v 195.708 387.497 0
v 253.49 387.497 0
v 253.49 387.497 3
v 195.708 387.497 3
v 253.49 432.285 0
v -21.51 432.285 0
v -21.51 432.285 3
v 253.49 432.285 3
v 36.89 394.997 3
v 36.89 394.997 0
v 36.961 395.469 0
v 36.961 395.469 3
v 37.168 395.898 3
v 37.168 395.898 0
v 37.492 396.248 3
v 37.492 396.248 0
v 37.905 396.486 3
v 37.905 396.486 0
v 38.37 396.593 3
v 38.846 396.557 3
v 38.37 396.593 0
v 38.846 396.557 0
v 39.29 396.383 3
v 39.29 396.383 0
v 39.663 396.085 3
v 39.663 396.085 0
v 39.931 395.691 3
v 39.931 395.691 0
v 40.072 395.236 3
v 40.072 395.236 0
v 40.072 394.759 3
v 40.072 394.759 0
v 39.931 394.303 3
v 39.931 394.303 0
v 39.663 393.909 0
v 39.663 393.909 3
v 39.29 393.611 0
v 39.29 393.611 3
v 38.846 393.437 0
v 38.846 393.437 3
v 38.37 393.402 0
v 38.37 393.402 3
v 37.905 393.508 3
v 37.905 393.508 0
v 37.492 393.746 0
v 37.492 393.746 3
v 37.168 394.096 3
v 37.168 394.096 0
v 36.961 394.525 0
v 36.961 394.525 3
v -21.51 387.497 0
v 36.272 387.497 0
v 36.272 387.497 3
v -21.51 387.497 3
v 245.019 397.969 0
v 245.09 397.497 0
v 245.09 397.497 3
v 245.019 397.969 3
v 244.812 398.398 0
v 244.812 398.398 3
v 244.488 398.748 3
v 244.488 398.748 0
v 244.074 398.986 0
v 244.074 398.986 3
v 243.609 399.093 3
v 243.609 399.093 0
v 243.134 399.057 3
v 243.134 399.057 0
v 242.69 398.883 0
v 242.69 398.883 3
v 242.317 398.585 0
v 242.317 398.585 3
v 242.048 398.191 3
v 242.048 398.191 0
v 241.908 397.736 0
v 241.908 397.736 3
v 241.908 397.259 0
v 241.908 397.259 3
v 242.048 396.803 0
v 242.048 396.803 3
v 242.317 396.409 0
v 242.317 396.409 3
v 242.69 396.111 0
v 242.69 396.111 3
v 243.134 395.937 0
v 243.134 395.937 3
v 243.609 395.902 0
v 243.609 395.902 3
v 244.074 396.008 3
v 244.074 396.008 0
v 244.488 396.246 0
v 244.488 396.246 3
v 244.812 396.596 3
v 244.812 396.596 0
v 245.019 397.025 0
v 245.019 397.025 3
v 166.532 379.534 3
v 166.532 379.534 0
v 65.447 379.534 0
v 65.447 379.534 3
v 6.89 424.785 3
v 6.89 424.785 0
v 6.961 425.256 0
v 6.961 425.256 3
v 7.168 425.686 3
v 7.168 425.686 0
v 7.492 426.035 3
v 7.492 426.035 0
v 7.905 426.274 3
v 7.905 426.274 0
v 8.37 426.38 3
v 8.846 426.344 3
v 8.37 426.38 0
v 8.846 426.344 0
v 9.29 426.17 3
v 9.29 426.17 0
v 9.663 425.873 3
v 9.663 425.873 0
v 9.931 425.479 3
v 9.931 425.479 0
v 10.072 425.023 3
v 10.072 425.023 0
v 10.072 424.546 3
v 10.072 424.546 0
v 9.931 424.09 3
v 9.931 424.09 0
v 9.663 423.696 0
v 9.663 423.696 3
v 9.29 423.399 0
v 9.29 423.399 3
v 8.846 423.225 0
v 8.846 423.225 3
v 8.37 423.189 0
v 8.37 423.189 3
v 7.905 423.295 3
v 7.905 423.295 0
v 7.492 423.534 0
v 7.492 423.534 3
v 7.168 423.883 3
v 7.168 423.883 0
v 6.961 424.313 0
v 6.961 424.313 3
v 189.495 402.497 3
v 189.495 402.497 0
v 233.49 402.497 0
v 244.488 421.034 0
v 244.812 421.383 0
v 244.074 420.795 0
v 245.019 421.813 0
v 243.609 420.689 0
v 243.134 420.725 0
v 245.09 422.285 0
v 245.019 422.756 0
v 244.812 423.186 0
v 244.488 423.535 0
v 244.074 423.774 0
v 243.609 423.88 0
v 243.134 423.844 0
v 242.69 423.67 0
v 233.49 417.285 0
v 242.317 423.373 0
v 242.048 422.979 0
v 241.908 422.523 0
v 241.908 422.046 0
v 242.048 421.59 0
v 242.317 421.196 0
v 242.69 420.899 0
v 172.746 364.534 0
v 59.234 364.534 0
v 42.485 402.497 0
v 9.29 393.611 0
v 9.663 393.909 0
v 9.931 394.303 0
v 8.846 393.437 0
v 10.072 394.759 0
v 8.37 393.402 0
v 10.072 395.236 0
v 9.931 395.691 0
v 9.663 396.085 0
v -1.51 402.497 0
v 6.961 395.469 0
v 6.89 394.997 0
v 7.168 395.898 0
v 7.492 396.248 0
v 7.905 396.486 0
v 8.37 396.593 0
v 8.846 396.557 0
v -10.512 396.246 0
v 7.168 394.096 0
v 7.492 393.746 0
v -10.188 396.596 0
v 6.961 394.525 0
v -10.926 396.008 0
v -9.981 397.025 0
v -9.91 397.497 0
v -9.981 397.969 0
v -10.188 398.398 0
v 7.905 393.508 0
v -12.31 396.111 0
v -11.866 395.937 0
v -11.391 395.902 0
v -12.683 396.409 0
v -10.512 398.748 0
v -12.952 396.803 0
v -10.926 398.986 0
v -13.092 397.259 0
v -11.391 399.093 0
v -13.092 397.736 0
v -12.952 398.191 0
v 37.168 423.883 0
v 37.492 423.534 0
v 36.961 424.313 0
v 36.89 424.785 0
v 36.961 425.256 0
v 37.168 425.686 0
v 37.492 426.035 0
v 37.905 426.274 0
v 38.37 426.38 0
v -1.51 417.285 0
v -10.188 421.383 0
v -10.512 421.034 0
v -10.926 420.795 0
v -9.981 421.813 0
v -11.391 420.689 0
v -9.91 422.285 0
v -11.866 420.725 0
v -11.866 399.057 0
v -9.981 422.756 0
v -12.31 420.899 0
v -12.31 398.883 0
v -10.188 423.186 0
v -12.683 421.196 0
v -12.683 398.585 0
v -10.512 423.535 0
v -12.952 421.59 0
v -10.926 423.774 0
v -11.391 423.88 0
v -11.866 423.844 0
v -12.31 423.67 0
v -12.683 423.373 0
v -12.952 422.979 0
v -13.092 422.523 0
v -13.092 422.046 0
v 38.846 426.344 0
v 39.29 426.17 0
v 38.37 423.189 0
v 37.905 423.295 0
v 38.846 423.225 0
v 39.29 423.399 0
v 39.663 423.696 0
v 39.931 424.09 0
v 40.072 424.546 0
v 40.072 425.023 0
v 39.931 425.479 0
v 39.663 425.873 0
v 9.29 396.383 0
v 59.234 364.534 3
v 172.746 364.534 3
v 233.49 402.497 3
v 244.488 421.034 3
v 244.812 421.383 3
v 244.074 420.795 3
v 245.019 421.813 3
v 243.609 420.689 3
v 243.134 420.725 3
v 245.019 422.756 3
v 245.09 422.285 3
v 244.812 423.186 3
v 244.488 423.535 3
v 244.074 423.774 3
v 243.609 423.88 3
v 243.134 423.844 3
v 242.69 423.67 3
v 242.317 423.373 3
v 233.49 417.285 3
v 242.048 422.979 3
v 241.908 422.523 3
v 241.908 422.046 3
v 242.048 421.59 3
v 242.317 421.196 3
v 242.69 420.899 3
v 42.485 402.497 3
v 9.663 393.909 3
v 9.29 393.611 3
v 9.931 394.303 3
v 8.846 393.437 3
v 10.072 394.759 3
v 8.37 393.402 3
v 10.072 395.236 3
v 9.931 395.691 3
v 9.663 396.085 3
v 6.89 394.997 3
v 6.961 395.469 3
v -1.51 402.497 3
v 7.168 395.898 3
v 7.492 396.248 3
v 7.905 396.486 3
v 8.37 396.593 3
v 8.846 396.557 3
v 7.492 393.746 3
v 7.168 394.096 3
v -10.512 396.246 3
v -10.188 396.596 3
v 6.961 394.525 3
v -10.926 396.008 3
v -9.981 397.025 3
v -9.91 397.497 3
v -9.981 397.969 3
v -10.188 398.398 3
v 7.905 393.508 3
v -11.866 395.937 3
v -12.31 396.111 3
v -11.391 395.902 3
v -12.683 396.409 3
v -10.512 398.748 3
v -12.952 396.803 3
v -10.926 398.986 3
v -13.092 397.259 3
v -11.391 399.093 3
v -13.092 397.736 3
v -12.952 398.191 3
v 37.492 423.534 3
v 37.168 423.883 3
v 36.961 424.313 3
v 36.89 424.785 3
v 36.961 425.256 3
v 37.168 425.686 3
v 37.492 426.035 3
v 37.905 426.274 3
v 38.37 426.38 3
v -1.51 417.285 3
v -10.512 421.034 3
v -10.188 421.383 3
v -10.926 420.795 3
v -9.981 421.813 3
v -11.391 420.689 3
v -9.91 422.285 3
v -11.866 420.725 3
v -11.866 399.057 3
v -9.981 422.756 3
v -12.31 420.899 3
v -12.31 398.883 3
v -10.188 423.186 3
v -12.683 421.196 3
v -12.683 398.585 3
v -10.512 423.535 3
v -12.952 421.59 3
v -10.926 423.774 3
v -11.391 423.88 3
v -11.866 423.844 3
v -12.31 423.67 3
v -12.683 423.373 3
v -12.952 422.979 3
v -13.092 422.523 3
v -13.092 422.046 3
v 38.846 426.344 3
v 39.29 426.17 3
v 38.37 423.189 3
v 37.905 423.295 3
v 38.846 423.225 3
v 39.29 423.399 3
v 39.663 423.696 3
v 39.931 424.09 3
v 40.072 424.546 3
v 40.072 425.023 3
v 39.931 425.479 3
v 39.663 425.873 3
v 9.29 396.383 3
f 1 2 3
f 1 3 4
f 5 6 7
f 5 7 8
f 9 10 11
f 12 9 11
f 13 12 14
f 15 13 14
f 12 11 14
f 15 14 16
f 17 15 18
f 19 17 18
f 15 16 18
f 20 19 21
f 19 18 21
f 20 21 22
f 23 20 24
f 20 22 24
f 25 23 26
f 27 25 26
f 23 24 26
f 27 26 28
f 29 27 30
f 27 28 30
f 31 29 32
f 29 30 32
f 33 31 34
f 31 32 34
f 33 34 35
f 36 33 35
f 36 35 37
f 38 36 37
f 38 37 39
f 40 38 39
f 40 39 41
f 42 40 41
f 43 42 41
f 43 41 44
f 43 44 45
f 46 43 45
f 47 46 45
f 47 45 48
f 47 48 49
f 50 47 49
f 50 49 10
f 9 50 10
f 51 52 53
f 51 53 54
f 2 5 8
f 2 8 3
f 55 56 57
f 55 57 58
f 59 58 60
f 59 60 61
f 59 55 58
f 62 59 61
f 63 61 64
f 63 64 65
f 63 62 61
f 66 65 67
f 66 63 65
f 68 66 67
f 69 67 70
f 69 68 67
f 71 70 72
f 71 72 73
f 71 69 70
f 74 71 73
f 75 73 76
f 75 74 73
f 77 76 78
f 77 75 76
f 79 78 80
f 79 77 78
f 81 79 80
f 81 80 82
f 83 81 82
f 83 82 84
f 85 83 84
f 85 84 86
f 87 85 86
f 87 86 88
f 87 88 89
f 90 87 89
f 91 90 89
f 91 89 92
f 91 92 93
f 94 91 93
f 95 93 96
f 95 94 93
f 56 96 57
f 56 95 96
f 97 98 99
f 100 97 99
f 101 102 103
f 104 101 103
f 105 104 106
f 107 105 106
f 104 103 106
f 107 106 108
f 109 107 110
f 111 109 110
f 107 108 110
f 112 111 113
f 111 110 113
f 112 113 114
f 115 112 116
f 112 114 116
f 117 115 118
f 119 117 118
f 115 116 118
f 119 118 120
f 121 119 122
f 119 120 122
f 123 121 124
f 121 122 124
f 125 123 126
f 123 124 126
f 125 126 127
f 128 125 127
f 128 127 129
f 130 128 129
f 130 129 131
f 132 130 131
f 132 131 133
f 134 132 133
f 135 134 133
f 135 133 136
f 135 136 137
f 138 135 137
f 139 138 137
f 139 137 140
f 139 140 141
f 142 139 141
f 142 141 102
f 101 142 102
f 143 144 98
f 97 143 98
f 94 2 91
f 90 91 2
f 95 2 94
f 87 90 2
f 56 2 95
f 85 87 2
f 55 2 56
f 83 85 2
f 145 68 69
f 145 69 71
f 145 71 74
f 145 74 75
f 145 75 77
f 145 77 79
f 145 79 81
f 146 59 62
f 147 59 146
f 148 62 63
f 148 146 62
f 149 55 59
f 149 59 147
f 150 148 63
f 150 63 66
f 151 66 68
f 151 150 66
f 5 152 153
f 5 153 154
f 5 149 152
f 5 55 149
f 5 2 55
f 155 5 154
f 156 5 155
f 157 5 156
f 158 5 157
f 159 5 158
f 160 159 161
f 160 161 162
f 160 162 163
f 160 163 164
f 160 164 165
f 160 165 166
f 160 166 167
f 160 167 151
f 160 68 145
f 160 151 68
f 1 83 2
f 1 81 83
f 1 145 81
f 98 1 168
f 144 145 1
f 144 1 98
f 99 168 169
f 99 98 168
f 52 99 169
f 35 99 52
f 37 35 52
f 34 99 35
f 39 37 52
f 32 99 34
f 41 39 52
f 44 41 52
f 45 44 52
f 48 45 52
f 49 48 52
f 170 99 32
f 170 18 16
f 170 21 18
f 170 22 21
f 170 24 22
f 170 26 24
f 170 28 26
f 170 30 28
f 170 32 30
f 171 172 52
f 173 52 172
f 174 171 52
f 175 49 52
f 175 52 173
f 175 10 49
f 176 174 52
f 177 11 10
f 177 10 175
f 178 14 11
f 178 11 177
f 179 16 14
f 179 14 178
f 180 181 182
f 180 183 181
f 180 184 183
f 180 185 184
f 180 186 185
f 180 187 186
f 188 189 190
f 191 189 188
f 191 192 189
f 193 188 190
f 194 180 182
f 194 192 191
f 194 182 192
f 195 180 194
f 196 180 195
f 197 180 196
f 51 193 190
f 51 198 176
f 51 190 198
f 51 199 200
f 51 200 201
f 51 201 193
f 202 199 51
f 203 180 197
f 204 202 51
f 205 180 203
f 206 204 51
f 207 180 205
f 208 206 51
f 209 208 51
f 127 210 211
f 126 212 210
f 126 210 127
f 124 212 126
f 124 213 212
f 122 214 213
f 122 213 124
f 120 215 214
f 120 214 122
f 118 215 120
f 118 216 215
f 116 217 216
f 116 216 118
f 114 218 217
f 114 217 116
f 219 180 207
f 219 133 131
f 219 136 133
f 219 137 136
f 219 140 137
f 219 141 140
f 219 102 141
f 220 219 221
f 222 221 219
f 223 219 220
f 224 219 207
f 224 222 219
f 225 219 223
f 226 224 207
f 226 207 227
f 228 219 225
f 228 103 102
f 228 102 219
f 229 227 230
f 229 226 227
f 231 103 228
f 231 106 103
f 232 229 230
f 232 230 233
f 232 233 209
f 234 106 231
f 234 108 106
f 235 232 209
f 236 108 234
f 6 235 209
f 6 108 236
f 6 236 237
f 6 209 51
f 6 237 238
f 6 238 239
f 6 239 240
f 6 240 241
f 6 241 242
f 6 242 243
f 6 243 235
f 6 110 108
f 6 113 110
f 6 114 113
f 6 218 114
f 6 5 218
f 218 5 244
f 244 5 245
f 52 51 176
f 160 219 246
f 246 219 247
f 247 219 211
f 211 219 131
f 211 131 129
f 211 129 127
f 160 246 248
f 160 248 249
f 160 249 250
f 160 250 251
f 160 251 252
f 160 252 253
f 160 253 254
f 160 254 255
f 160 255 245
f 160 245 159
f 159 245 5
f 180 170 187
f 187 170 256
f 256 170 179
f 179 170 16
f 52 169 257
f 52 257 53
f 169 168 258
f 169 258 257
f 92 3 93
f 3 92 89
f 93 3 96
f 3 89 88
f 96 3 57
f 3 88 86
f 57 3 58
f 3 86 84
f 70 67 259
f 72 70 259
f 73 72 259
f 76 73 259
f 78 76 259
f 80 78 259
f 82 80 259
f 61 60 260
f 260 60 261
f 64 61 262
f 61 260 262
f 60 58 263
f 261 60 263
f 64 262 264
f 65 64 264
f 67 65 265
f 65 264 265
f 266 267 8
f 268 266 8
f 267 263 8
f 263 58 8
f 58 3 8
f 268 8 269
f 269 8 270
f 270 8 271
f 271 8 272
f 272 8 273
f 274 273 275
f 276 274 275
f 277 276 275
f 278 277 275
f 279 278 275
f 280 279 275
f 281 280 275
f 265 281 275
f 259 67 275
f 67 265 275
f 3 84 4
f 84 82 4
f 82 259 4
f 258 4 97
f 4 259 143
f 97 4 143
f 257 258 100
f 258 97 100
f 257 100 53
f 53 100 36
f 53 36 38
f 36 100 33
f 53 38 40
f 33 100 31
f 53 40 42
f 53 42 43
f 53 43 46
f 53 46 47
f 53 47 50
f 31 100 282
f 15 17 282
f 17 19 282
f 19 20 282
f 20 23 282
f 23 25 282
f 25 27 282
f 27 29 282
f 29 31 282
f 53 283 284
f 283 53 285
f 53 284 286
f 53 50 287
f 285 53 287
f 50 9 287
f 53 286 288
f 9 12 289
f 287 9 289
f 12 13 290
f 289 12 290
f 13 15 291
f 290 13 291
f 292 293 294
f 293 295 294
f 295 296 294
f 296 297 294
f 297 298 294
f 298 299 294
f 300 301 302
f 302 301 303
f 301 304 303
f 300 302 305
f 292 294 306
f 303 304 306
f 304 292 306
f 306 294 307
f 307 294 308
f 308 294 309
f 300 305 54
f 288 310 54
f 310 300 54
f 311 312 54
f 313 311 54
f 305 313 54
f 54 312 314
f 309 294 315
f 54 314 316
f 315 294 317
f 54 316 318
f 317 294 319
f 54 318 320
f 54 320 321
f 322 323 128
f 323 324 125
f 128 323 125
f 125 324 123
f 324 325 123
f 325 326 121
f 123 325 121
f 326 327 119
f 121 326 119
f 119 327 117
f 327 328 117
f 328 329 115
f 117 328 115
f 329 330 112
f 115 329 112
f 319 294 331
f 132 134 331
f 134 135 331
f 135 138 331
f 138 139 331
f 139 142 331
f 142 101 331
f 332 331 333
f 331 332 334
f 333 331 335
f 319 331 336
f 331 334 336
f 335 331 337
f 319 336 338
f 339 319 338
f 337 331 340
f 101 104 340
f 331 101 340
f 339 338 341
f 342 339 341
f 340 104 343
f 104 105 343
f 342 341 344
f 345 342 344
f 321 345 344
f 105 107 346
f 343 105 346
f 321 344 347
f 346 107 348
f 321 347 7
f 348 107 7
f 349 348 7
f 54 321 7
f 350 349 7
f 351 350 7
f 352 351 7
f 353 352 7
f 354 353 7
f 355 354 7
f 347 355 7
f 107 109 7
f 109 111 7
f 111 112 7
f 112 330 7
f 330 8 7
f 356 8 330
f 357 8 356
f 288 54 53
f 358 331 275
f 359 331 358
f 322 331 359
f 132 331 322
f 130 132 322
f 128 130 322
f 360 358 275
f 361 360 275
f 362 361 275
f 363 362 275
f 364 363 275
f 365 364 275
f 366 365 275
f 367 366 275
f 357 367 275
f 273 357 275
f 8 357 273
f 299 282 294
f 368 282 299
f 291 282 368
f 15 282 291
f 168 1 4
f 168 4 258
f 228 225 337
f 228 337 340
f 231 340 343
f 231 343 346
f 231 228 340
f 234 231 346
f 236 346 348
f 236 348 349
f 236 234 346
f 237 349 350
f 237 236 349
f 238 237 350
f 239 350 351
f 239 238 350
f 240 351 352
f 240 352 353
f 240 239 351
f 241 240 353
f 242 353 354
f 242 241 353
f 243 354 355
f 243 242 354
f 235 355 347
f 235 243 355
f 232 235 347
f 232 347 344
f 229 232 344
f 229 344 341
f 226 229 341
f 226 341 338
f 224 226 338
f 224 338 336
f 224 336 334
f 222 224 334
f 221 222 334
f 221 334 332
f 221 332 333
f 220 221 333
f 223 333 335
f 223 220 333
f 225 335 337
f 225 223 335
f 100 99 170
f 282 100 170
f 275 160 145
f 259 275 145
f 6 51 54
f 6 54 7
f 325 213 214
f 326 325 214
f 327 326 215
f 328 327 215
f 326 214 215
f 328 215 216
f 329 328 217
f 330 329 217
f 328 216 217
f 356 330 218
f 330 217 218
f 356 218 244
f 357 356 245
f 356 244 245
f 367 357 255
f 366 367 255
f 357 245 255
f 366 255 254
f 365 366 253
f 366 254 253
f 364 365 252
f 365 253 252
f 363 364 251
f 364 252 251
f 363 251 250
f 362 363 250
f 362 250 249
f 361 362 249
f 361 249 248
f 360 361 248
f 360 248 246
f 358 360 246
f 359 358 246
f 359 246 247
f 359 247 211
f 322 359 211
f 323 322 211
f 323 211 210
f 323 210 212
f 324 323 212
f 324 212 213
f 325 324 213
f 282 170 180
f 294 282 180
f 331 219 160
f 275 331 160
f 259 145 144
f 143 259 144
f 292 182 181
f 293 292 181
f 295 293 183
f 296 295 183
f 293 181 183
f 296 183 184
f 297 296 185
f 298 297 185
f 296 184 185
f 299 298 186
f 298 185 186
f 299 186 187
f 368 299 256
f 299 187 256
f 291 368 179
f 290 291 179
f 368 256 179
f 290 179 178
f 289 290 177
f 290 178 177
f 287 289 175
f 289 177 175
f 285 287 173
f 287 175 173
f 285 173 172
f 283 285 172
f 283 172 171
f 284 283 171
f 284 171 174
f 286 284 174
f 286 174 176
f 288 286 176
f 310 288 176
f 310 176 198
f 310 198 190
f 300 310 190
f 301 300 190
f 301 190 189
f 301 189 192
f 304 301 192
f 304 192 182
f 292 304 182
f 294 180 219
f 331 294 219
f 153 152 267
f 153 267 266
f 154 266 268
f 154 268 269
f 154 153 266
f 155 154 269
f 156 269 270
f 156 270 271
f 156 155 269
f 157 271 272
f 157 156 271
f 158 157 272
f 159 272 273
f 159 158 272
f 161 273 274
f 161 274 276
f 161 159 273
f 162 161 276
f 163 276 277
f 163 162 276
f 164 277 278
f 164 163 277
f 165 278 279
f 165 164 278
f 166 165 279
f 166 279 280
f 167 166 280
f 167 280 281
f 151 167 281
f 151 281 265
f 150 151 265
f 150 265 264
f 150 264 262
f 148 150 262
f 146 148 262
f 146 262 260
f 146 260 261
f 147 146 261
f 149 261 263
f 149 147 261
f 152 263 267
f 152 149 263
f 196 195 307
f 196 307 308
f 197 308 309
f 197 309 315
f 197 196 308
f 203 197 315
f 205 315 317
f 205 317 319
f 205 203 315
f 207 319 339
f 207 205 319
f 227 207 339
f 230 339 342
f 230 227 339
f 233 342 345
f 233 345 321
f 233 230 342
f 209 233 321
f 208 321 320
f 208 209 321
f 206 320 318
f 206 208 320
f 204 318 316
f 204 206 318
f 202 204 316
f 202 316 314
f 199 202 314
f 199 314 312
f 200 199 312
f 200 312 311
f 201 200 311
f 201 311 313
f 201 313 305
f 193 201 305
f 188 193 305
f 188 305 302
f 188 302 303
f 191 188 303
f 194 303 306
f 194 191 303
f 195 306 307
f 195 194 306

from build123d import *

# Parameters (mm, degrees)
SKETCH1_R          = 1.6
EXTRUDE1_DEPTH     = 3
SKETCH2_R          = 1.6
CUT_EXTRUDE1_DEPTH = 5


with BuildPart() as part:
    # Sketch1 → Extrude1 (new body)
    with BuildSketch(Plane.XY):
        Polygon((-21.510078765, 432.284503285), (253.489921235, 432.284503285), (253.489921235, 387.497048214), (195.708175305, 387.497048214), (172.745594885, 364.534467794), (59.234247585, 364.534467794), (36.271667166, 387.497048214), (-21.510078765, 387.497048214), align=None)
        with Locations((-11.510078765, 422.284503285)):
            Circle(SKETCH1_R, mode=Mode.SUBTRACT)
        with Locations((-11.510078765, 397.497048214)):
            Circle(SKETCH1_R, mode=Mode.SUBTRACT)
        with Locations((243.489921235, 397.497048214)):
            Circle(SKETCH1_R, mode=Mode.SUBTRACT)
        with Locations((243.489921235, 422.284503285)):
            Circle(SKETCH1_R, mode=Mode.SUBTRACT)
        Polygon((-1.510078765, 417.284503285), (233.489921235, 417.284503285), (233.489921235, 402.497048214), (189.494971869, 402.497048214), (166.53239145, 379.534467794), (65.44745102, 379.534467794), (42.484870601, 402.497048214), (-1.510078765, 402.497048214), align=None, mode=Mode.SUBTRACT)
    extrude(amount=EXTRUDE1_DEPTH)

    # Sketch2 → Cut-Extrude1 (cut)
    with BuildSketch(Plane(origin=(0, 0, 0), x_dir=(-1, 0, 0), z_dir=(0, 0, -1))):
        with Locations((-38.489921235, 424.784503285)):
            Circle(SKETCH2_R)
        with Locations((-8.489921235, 424.784503285)):
            Circle(SKETCH2_R)
        with Locations((-38.489921235, 394.997048214)):
            Circle(SKETCH2_R)
        with Locations((-8.489921235, 394.997048214)):
            Circle(SKETCH2_R)
    extrude(amount=-CUT_EXTRUDE1_DEPTH, mode=Mode.SUBTRACT)


solid = part.part
